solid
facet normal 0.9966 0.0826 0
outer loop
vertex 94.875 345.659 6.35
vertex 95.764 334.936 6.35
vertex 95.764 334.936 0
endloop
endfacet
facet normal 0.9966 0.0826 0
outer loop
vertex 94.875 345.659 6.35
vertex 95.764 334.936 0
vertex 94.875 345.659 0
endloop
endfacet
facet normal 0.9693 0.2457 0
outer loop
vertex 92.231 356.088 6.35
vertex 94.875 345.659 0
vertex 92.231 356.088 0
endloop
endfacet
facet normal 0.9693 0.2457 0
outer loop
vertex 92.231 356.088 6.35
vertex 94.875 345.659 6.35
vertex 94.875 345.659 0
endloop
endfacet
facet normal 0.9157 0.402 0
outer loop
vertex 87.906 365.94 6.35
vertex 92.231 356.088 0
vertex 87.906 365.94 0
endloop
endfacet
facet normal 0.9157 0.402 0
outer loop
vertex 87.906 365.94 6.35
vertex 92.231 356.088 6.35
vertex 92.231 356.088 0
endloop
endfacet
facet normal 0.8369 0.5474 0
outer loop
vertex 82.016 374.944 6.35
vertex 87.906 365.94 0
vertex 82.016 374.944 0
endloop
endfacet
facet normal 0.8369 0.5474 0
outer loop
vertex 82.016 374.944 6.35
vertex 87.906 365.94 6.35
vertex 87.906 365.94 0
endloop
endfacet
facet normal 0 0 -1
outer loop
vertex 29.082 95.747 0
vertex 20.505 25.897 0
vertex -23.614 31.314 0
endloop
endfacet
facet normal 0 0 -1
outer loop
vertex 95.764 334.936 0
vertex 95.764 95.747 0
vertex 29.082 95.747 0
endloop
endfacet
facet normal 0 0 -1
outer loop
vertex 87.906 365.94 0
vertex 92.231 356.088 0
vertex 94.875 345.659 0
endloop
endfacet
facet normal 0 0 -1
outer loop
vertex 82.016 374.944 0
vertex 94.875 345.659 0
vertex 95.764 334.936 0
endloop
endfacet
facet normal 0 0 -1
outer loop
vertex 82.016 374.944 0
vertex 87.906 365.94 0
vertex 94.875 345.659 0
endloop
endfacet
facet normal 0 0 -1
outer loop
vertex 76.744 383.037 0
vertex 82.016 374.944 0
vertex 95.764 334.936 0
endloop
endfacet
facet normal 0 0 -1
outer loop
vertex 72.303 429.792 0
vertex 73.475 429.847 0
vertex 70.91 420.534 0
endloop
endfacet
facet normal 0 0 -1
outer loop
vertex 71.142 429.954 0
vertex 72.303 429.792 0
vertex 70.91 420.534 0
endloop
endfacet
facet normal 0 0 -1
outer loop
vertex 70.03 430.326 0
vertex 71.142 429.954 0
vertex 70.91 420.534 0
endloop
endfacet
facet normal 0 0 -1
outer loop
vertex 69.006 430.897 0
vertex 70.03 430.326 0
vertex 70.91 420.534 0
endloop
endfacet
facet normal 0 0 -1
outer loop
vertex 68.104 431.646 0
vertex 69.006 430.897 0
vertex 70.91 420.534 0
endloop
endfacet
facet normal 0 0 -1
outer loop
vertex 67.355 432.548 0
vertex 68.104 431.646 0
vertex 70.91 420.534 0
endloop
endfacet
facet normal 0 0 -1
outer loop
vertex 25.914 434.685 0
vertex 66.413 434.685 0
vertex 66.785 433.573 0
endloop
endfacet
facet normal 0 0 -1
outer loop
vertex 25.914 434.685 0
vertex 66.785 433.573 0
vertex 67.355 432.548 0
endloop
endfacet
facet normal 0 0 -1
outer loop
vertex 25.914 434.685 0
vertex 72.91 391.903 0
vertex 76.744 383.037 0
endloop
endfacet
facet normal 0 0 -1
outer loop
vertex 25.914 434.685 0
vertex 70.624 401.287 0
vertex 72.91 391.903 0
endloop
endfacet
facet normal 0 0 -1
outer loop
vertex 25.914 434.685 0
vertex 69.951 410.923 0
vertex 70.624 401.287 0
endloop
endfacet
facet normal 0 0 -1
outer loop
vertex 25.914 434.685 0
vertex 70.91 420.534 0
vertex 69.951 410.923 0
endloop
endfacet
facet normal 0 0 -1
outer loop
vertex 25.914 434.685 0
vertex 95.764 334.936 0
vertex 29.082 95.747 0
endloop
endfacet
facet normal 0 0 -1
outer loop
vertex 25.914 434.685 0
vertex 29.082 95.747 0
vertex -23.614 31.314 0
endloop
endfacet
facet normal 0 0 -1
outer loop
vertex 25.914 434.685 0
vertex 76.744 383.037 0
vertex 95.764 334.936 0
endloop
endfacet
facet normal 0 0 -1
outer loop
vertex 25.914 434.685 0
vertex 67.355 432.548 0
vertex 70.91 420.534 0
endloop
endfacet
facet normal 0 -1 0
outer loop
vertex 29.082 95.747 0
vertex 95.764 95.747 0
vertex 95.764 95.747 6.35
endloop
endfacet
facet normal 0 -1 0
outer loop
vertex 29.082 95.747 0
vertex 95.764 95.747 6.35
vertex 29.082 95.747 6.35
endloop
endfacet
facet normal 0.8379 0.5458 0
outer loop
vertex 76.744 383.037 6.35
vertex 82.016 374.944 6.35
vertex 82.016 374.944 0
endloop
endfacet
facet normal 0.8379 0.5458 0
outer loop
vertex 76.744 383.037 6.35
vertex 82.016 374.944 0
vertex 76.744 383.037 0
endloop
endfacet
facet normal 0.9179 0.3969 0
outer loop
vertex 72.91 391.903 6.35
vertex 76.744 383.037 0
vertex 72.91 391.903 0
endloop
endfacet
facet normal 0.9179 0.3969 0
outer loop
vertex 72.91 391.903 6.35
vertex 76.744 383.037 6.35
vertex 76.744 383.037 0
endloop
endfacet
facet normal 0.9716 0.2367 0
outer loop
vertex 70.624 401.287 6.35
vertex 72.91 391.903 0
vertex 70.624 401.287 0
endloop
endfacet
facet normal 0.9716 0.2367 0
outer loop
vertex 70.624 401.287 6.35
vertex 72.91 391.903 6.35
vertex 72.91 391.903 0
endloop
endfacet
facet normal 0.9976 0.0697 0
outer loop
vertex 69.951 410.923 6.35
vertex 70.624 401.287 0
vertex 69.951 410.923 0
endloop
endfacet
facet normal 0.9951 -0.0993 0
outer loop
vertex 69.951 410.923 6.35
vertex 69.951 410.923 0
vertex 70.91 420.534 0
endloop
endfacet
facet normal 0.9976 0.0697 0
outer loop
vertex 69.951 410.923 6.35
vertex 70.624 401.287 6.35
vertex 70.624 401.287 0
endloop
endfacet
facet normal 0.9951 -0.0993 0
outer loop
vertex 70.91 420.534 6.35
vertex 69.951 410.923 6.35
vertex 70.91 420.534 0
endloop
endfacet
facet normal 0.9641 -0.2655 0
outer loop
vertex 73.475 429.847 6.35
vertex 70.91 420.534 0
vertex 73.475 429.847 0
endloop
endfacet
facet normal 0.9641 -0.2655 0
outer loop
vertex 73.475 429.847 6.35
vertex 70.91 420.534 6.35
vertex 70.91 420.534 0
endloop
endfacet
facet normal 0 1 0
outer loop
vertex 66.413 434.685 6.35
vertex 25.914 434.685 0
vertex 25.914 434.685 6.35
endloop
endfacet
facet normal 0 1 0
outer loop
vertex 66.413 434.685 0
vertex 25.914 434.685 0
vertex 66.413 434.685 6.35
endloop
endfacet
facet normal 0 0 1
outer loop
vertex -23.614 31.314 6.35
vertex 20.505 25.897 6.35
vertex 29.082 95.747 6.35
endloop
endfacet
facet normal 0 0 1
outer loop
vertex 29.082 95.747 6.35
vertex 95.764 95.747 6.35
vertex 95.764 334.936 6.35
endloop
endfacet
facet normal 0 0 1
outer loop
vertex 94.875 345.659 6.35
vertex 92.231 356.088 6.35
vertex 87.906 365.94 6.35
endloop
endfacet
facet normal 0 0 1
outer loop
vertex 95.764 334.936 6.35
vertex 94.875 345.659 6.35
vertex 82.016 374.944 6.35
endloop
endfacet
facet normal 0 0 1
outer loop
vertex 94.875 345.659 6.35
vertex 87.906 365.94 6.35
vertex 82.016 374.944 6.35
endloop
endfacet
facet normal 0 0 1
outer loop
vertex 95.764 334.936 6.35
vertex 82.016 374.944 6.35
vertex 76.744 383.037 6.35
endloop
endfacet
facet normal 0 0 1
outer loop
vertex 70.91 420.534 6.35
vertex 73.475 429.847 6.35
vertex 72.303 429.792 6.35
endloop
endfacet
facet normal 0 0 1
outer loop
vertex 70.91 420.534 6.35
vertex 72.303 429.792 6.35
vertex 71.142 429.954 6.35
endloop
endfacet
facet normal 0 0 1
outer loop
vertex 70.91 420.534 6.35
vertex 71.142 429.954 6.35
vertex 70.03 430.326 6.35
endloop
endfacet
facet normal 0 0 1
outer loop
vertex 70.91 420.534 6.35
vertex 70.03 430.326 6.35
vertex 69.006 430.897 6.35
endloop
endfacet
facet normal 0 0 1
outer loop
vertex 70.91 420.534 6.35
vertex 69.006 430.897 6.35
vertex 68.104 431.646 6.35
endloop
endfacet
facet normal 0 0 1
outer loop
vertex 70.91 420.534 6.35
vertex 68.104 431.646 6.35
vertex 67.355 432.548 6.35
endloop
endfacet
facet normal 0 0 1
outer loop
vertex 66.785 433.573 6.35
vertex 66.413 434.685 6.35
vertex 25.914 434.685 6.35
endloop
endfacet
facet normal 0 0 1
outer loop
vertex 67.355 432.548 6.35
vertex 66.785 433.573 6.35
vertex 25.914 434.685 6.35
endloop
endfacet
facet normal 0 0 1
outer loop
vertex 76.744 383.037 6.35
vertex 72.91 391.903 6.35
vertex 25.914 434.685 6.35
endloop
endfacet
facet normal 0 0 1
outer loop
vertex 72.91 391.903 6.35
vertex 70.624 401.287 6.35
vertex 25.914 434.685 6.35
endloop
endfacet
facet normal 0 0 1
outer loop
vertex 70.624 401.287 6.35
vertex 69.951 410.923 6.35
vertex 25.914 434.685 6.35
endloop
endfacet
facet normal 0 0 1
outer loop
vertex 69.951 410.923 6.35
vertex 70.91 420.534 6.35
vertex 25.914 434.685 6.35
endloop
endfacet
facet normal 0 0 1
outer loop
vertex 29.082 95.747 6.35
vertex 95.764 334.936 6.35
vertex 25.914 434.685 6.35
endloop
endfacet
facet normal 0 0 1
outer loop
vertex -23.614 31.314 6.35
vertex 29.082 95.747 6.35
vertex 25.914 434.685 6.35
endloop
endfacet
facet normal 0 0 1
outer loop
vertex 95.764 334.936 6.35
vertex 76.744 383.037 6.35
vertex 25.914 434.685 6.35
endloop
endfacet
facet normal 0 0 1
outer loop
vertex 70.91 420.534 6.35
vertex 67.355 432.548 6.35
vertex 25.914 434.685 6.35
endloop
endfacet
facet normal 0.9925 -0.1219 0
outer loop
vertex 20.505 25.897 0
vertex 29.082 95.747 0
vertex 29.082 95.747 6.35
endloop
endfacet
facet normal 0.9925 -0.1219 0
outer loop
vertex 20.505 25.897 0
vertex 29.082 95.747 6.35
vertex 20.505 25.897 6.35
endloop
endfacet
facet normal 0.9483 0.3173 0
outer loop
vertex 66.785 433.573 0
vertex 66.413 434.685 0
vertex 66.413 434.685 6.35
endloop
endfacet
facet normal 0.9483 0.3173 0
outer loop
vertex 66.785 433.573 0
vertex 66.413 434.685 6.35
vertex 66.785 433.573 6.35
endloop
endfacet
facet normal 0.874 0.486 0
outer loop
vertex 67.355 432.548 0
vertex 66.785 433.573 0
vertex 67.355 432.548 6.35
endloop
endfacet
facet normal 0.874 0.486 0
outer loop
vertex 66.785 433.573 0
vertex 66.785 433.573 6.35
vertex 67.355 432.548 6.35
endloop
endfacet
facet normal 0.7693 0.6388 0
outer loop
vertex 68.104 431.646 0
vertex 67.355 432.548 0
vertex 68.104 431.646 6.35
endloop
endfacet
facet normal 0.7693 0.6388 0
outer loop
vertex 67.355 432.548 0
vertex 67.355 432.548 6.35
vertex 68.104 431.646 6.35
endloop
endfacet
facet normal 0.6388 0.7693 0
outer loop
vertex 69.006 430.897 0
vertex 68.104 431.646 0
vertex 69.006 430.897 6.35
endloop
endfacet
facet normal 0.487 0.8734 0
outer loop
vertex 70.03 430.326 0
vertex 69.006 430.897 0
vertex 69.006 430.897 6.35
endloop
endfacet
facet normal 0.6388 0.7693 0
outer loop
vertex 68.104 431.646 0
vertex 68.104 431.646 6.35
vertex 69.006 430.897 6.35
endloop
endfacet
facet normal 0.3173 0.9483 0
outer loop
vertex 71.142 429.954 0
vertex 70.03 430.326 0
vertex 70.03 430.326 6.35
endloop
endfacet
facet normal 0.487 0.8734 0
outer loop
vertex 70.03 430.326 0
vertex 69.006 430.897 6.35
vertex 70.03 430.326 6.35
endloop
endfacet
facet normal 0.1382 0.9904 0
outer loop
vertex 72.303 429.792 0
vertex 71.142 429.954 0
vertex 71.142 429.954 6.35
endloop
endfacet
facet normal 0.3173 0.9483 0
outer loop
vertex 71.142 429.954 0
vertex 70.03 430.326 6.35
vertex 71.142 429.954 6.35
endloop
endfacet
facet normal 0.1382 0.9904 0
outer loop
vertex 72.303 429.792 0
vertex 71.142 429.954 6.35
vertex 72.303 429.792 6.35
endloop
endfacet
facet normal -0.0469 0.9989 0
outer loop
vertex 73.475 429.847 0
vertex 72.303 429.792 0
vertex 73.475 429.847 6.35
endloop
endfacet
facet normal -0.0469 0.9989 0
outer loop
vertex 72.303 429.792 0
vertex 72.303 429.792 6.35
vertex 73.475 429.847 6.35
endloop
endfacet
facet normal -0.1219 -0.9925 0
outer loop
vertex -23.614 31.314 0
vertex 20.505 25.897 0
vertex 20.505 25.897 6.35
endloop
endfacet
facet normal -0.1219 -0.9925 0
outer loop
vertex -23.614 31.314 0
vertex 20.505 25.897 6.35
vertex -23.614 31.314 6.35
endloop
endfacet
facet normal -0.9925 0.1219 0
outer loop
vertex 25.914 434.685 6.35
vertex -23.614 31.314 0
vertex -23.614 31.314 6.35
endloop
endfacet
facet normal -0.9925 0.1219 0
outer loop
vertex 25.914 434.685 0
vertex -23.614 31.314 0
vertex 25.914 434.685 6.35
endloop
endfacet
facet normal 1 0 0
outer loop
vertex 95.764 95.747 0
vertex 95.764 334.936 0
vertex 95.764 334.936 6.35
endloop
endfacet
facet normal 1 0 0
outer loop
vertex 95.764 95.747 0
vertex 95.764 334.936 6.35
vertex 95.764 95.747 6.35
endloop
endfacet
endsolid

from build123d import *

# Parameters (mm, degrees)
BOSS_EXTRUDE1_DEPTH = 6.35
SKETCH2_R           = 6.35
CUT_EXTRUDE1_DEPTH  = 6.35
CUT_EXTRUDE4_DEPTH  = 6.35


with BuildPart() as part:
    # Sketch1 → Boss-Extrude1 (new body)
    with BuildSketch(Plane.XY):
        Polygon((20.505148302, 25.897062134), (-23.613528139, 31.314154449), (25.914173021, 434.684910476), (95.764173021, 434.684910476), (95.764173021, 95.747062134), (29.081649881, 95.747062134), align=None)
    extrude(amount=BOSS_EXTRUDE1_DEPTH)

    # Sketch2 → Cut-Extrude1 (cut)
    with BuildSketch(Plane.XY.offset(6.35)):
        with Locations((72.594859494, 436.135448726)):
            Circle(SKETCH2_R)
    extrude(amount=-CUT_EXTRUDE1_DEPTH, mode=Mode.SUBTRACT)

    # Sketch4 → Cut-Extrude4 (cut)
    with BuildSketch(Plane.XY.offset(6.35)):
        with BuildLine():
            Line((74.295018445, 431.943320697), (82.016159891, 440.361424689))
            Line((82.016159891, 440.361424689), (105.989857785, 438.164600241))
            Line((105.989857785, 438.164600241), (95.764173021, 334.935994434))
            ThreePointArc((95.764173021, 334.935994434), (92.231289046, 356.088107858), (82.016159891, 374.943990437))
            ThreePointArc((82.016159891, 374.943990437), (70.461962448, 402.401475249), (74.295018445, 431.943320697))
        make_face()
    extrude(amount=-CUT_EXTRUDE4_DEPTH, mode=Mode.SUBTRACT)


solid = part.part
